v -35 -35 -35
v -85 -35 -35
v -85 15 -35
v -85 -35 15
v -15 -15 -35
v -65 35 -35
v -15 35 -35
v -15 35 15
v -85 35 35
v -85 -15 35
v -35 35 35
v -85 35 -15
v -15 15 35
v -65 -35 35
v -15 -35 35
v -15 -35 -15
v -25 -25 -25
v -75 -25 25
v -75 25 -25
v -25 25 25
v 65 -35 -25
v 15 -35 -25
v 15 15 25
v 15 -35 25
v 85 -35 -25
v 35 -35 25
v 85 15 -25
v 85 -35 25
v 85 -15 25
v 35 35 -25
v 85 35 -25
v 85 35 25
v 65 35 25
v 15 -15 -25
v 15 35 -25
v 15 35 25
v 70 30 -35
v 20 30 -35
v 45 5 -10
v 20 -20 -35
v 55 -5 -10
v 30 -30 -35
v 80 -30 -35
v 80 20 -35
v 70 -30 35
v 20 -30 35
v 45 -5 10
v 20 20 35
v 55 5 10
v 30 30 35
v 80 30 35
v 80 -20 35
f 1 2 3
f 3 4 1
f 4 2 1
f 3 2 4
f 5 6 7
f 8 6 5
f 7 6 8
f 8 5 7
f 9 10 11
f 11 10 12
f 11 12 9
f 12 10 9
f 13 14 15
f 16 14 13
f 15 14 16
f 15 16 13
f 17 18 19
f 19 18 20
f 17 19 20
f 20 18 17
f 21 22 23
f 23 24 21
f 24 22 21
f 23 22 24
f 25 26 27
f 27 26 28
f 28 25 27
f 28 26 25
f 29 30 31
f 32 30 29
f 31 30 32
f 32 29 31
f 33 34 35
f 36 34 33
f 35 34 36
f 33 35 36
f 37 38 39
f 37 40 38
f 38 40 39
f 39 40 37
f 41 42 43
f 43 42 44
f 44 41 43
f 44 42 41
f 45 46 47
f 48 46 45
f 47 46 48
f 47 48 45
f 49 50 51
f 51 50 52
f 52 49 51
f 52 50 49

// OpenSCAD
module tet1()
	polyhedron(
		points=[
			[ 0, 0, 0 ],
			[ 1, 0, 0 ],
			[ 0, 1, 0 ],
			[ 0, 0, 1 ]
		], triangles=[
			[ 0, 1, 2 ],
			[ 0, 3, 1 ],
			[ 0, 2, 3 ],
			[ 1, 3, 2 ]
		]);

module tet2()
	polyhedron(
		points=[
			[ 0, 0, 0 ],
			[ 1, 1, 0 ],
			[ 0, 1, 1 ],
			[ 1, 0, 1 ]
		], triangles=[
			[ 0, 1, 2 ],
			[ 0, 3, 1 ],
			[ 0, 2, 3 ],
			[ 1, 3, 2 ]
		]);

module cube1(s)
{
	translate([-s, -s, -s]) rotate([   0, 0,   0 ]) tet1();
	translate([+s, +s, -s]) rotate([   0, 0, 180 ]) tet1();
	translate([-s, +s, +s]) rotate([ 180, 0,   0 ]) tet1();
	translate([+s, -s, +s]) rotate([ 180, 0, 180 ]) tet1();
	rotate([0, 0, 90]) translate([-0.5, -0.5, -0.5]) tet2();
}

module tet3()
	polyhedron(
		points=[
			[ 0, 0, 0 ],
			[ 1, 0, 0 ],
			[ 0, 1, 1 ],
			[ 0, 0, 1 ]
		], triangles=[
			[ 0, 1, 2 ],
			[ 0, 3, 1 ],
			[ 0, 2, 3 ],
			[ 1, 3, 2 ]
		]);

module tet4()
	polyhedron(
		points=[
			[  0,    0,   0.5 ],
			[  0.5,  0.5, 0   ],
			[ -0.5,  0.5, 0   ],
			[ -0.5, -0.5, 0   ]
		], triangles=[
			[ 0, 2, 1 ],
			[ 0, 1, 3 ],
			[ 0, 3, 2 ],
			[ 1, 2, 3 ]
		]);

module cube2(s)
{
	translate([-s, -s, -0.5]) rotate([ 0, 0,   0 ]) tet3();
	translate([+s, -s, -0.5]) rotate([ 0, 0,  90 ]) tet3();
	translate([+s, +s, -0.5]) rotate([ 0, 0, 180 ]) tet3();
	translate([-s, +s, -0.5]) rotate([ 0, 0, 270 ]) tet3();
	translate([-s/2+0.25, +s/2-0.25, -s]) rotate([ 0, 0,   0 ]) tet4();
	translate([+s/2-0.25, -s/2+0.25, -s]) rotate([ 0, 0, 180 ]) tet4();
	translate([-s/2+0.25, -s/2+0.25, +s]) rotate([ 180, 0,   0 ]) tet4();
	translate([+s/2-0.25, +s/2-0.25, +s]) rotate([ 180, 0, 180 ]) tet4();


}

// all set up:
translate([-50, 0, 0]) scale(50) cube1(0.7);
translate([+50, 0, 0]) scale(50) cube2(0.7);

// seperate parts for printing:
// scale(50) tet1();
// scale(50) rotate(55, [1,1,0]) tet2();
// scale(50) rotate([-45,0,0]) tet3();
// scale(50) tet4();
